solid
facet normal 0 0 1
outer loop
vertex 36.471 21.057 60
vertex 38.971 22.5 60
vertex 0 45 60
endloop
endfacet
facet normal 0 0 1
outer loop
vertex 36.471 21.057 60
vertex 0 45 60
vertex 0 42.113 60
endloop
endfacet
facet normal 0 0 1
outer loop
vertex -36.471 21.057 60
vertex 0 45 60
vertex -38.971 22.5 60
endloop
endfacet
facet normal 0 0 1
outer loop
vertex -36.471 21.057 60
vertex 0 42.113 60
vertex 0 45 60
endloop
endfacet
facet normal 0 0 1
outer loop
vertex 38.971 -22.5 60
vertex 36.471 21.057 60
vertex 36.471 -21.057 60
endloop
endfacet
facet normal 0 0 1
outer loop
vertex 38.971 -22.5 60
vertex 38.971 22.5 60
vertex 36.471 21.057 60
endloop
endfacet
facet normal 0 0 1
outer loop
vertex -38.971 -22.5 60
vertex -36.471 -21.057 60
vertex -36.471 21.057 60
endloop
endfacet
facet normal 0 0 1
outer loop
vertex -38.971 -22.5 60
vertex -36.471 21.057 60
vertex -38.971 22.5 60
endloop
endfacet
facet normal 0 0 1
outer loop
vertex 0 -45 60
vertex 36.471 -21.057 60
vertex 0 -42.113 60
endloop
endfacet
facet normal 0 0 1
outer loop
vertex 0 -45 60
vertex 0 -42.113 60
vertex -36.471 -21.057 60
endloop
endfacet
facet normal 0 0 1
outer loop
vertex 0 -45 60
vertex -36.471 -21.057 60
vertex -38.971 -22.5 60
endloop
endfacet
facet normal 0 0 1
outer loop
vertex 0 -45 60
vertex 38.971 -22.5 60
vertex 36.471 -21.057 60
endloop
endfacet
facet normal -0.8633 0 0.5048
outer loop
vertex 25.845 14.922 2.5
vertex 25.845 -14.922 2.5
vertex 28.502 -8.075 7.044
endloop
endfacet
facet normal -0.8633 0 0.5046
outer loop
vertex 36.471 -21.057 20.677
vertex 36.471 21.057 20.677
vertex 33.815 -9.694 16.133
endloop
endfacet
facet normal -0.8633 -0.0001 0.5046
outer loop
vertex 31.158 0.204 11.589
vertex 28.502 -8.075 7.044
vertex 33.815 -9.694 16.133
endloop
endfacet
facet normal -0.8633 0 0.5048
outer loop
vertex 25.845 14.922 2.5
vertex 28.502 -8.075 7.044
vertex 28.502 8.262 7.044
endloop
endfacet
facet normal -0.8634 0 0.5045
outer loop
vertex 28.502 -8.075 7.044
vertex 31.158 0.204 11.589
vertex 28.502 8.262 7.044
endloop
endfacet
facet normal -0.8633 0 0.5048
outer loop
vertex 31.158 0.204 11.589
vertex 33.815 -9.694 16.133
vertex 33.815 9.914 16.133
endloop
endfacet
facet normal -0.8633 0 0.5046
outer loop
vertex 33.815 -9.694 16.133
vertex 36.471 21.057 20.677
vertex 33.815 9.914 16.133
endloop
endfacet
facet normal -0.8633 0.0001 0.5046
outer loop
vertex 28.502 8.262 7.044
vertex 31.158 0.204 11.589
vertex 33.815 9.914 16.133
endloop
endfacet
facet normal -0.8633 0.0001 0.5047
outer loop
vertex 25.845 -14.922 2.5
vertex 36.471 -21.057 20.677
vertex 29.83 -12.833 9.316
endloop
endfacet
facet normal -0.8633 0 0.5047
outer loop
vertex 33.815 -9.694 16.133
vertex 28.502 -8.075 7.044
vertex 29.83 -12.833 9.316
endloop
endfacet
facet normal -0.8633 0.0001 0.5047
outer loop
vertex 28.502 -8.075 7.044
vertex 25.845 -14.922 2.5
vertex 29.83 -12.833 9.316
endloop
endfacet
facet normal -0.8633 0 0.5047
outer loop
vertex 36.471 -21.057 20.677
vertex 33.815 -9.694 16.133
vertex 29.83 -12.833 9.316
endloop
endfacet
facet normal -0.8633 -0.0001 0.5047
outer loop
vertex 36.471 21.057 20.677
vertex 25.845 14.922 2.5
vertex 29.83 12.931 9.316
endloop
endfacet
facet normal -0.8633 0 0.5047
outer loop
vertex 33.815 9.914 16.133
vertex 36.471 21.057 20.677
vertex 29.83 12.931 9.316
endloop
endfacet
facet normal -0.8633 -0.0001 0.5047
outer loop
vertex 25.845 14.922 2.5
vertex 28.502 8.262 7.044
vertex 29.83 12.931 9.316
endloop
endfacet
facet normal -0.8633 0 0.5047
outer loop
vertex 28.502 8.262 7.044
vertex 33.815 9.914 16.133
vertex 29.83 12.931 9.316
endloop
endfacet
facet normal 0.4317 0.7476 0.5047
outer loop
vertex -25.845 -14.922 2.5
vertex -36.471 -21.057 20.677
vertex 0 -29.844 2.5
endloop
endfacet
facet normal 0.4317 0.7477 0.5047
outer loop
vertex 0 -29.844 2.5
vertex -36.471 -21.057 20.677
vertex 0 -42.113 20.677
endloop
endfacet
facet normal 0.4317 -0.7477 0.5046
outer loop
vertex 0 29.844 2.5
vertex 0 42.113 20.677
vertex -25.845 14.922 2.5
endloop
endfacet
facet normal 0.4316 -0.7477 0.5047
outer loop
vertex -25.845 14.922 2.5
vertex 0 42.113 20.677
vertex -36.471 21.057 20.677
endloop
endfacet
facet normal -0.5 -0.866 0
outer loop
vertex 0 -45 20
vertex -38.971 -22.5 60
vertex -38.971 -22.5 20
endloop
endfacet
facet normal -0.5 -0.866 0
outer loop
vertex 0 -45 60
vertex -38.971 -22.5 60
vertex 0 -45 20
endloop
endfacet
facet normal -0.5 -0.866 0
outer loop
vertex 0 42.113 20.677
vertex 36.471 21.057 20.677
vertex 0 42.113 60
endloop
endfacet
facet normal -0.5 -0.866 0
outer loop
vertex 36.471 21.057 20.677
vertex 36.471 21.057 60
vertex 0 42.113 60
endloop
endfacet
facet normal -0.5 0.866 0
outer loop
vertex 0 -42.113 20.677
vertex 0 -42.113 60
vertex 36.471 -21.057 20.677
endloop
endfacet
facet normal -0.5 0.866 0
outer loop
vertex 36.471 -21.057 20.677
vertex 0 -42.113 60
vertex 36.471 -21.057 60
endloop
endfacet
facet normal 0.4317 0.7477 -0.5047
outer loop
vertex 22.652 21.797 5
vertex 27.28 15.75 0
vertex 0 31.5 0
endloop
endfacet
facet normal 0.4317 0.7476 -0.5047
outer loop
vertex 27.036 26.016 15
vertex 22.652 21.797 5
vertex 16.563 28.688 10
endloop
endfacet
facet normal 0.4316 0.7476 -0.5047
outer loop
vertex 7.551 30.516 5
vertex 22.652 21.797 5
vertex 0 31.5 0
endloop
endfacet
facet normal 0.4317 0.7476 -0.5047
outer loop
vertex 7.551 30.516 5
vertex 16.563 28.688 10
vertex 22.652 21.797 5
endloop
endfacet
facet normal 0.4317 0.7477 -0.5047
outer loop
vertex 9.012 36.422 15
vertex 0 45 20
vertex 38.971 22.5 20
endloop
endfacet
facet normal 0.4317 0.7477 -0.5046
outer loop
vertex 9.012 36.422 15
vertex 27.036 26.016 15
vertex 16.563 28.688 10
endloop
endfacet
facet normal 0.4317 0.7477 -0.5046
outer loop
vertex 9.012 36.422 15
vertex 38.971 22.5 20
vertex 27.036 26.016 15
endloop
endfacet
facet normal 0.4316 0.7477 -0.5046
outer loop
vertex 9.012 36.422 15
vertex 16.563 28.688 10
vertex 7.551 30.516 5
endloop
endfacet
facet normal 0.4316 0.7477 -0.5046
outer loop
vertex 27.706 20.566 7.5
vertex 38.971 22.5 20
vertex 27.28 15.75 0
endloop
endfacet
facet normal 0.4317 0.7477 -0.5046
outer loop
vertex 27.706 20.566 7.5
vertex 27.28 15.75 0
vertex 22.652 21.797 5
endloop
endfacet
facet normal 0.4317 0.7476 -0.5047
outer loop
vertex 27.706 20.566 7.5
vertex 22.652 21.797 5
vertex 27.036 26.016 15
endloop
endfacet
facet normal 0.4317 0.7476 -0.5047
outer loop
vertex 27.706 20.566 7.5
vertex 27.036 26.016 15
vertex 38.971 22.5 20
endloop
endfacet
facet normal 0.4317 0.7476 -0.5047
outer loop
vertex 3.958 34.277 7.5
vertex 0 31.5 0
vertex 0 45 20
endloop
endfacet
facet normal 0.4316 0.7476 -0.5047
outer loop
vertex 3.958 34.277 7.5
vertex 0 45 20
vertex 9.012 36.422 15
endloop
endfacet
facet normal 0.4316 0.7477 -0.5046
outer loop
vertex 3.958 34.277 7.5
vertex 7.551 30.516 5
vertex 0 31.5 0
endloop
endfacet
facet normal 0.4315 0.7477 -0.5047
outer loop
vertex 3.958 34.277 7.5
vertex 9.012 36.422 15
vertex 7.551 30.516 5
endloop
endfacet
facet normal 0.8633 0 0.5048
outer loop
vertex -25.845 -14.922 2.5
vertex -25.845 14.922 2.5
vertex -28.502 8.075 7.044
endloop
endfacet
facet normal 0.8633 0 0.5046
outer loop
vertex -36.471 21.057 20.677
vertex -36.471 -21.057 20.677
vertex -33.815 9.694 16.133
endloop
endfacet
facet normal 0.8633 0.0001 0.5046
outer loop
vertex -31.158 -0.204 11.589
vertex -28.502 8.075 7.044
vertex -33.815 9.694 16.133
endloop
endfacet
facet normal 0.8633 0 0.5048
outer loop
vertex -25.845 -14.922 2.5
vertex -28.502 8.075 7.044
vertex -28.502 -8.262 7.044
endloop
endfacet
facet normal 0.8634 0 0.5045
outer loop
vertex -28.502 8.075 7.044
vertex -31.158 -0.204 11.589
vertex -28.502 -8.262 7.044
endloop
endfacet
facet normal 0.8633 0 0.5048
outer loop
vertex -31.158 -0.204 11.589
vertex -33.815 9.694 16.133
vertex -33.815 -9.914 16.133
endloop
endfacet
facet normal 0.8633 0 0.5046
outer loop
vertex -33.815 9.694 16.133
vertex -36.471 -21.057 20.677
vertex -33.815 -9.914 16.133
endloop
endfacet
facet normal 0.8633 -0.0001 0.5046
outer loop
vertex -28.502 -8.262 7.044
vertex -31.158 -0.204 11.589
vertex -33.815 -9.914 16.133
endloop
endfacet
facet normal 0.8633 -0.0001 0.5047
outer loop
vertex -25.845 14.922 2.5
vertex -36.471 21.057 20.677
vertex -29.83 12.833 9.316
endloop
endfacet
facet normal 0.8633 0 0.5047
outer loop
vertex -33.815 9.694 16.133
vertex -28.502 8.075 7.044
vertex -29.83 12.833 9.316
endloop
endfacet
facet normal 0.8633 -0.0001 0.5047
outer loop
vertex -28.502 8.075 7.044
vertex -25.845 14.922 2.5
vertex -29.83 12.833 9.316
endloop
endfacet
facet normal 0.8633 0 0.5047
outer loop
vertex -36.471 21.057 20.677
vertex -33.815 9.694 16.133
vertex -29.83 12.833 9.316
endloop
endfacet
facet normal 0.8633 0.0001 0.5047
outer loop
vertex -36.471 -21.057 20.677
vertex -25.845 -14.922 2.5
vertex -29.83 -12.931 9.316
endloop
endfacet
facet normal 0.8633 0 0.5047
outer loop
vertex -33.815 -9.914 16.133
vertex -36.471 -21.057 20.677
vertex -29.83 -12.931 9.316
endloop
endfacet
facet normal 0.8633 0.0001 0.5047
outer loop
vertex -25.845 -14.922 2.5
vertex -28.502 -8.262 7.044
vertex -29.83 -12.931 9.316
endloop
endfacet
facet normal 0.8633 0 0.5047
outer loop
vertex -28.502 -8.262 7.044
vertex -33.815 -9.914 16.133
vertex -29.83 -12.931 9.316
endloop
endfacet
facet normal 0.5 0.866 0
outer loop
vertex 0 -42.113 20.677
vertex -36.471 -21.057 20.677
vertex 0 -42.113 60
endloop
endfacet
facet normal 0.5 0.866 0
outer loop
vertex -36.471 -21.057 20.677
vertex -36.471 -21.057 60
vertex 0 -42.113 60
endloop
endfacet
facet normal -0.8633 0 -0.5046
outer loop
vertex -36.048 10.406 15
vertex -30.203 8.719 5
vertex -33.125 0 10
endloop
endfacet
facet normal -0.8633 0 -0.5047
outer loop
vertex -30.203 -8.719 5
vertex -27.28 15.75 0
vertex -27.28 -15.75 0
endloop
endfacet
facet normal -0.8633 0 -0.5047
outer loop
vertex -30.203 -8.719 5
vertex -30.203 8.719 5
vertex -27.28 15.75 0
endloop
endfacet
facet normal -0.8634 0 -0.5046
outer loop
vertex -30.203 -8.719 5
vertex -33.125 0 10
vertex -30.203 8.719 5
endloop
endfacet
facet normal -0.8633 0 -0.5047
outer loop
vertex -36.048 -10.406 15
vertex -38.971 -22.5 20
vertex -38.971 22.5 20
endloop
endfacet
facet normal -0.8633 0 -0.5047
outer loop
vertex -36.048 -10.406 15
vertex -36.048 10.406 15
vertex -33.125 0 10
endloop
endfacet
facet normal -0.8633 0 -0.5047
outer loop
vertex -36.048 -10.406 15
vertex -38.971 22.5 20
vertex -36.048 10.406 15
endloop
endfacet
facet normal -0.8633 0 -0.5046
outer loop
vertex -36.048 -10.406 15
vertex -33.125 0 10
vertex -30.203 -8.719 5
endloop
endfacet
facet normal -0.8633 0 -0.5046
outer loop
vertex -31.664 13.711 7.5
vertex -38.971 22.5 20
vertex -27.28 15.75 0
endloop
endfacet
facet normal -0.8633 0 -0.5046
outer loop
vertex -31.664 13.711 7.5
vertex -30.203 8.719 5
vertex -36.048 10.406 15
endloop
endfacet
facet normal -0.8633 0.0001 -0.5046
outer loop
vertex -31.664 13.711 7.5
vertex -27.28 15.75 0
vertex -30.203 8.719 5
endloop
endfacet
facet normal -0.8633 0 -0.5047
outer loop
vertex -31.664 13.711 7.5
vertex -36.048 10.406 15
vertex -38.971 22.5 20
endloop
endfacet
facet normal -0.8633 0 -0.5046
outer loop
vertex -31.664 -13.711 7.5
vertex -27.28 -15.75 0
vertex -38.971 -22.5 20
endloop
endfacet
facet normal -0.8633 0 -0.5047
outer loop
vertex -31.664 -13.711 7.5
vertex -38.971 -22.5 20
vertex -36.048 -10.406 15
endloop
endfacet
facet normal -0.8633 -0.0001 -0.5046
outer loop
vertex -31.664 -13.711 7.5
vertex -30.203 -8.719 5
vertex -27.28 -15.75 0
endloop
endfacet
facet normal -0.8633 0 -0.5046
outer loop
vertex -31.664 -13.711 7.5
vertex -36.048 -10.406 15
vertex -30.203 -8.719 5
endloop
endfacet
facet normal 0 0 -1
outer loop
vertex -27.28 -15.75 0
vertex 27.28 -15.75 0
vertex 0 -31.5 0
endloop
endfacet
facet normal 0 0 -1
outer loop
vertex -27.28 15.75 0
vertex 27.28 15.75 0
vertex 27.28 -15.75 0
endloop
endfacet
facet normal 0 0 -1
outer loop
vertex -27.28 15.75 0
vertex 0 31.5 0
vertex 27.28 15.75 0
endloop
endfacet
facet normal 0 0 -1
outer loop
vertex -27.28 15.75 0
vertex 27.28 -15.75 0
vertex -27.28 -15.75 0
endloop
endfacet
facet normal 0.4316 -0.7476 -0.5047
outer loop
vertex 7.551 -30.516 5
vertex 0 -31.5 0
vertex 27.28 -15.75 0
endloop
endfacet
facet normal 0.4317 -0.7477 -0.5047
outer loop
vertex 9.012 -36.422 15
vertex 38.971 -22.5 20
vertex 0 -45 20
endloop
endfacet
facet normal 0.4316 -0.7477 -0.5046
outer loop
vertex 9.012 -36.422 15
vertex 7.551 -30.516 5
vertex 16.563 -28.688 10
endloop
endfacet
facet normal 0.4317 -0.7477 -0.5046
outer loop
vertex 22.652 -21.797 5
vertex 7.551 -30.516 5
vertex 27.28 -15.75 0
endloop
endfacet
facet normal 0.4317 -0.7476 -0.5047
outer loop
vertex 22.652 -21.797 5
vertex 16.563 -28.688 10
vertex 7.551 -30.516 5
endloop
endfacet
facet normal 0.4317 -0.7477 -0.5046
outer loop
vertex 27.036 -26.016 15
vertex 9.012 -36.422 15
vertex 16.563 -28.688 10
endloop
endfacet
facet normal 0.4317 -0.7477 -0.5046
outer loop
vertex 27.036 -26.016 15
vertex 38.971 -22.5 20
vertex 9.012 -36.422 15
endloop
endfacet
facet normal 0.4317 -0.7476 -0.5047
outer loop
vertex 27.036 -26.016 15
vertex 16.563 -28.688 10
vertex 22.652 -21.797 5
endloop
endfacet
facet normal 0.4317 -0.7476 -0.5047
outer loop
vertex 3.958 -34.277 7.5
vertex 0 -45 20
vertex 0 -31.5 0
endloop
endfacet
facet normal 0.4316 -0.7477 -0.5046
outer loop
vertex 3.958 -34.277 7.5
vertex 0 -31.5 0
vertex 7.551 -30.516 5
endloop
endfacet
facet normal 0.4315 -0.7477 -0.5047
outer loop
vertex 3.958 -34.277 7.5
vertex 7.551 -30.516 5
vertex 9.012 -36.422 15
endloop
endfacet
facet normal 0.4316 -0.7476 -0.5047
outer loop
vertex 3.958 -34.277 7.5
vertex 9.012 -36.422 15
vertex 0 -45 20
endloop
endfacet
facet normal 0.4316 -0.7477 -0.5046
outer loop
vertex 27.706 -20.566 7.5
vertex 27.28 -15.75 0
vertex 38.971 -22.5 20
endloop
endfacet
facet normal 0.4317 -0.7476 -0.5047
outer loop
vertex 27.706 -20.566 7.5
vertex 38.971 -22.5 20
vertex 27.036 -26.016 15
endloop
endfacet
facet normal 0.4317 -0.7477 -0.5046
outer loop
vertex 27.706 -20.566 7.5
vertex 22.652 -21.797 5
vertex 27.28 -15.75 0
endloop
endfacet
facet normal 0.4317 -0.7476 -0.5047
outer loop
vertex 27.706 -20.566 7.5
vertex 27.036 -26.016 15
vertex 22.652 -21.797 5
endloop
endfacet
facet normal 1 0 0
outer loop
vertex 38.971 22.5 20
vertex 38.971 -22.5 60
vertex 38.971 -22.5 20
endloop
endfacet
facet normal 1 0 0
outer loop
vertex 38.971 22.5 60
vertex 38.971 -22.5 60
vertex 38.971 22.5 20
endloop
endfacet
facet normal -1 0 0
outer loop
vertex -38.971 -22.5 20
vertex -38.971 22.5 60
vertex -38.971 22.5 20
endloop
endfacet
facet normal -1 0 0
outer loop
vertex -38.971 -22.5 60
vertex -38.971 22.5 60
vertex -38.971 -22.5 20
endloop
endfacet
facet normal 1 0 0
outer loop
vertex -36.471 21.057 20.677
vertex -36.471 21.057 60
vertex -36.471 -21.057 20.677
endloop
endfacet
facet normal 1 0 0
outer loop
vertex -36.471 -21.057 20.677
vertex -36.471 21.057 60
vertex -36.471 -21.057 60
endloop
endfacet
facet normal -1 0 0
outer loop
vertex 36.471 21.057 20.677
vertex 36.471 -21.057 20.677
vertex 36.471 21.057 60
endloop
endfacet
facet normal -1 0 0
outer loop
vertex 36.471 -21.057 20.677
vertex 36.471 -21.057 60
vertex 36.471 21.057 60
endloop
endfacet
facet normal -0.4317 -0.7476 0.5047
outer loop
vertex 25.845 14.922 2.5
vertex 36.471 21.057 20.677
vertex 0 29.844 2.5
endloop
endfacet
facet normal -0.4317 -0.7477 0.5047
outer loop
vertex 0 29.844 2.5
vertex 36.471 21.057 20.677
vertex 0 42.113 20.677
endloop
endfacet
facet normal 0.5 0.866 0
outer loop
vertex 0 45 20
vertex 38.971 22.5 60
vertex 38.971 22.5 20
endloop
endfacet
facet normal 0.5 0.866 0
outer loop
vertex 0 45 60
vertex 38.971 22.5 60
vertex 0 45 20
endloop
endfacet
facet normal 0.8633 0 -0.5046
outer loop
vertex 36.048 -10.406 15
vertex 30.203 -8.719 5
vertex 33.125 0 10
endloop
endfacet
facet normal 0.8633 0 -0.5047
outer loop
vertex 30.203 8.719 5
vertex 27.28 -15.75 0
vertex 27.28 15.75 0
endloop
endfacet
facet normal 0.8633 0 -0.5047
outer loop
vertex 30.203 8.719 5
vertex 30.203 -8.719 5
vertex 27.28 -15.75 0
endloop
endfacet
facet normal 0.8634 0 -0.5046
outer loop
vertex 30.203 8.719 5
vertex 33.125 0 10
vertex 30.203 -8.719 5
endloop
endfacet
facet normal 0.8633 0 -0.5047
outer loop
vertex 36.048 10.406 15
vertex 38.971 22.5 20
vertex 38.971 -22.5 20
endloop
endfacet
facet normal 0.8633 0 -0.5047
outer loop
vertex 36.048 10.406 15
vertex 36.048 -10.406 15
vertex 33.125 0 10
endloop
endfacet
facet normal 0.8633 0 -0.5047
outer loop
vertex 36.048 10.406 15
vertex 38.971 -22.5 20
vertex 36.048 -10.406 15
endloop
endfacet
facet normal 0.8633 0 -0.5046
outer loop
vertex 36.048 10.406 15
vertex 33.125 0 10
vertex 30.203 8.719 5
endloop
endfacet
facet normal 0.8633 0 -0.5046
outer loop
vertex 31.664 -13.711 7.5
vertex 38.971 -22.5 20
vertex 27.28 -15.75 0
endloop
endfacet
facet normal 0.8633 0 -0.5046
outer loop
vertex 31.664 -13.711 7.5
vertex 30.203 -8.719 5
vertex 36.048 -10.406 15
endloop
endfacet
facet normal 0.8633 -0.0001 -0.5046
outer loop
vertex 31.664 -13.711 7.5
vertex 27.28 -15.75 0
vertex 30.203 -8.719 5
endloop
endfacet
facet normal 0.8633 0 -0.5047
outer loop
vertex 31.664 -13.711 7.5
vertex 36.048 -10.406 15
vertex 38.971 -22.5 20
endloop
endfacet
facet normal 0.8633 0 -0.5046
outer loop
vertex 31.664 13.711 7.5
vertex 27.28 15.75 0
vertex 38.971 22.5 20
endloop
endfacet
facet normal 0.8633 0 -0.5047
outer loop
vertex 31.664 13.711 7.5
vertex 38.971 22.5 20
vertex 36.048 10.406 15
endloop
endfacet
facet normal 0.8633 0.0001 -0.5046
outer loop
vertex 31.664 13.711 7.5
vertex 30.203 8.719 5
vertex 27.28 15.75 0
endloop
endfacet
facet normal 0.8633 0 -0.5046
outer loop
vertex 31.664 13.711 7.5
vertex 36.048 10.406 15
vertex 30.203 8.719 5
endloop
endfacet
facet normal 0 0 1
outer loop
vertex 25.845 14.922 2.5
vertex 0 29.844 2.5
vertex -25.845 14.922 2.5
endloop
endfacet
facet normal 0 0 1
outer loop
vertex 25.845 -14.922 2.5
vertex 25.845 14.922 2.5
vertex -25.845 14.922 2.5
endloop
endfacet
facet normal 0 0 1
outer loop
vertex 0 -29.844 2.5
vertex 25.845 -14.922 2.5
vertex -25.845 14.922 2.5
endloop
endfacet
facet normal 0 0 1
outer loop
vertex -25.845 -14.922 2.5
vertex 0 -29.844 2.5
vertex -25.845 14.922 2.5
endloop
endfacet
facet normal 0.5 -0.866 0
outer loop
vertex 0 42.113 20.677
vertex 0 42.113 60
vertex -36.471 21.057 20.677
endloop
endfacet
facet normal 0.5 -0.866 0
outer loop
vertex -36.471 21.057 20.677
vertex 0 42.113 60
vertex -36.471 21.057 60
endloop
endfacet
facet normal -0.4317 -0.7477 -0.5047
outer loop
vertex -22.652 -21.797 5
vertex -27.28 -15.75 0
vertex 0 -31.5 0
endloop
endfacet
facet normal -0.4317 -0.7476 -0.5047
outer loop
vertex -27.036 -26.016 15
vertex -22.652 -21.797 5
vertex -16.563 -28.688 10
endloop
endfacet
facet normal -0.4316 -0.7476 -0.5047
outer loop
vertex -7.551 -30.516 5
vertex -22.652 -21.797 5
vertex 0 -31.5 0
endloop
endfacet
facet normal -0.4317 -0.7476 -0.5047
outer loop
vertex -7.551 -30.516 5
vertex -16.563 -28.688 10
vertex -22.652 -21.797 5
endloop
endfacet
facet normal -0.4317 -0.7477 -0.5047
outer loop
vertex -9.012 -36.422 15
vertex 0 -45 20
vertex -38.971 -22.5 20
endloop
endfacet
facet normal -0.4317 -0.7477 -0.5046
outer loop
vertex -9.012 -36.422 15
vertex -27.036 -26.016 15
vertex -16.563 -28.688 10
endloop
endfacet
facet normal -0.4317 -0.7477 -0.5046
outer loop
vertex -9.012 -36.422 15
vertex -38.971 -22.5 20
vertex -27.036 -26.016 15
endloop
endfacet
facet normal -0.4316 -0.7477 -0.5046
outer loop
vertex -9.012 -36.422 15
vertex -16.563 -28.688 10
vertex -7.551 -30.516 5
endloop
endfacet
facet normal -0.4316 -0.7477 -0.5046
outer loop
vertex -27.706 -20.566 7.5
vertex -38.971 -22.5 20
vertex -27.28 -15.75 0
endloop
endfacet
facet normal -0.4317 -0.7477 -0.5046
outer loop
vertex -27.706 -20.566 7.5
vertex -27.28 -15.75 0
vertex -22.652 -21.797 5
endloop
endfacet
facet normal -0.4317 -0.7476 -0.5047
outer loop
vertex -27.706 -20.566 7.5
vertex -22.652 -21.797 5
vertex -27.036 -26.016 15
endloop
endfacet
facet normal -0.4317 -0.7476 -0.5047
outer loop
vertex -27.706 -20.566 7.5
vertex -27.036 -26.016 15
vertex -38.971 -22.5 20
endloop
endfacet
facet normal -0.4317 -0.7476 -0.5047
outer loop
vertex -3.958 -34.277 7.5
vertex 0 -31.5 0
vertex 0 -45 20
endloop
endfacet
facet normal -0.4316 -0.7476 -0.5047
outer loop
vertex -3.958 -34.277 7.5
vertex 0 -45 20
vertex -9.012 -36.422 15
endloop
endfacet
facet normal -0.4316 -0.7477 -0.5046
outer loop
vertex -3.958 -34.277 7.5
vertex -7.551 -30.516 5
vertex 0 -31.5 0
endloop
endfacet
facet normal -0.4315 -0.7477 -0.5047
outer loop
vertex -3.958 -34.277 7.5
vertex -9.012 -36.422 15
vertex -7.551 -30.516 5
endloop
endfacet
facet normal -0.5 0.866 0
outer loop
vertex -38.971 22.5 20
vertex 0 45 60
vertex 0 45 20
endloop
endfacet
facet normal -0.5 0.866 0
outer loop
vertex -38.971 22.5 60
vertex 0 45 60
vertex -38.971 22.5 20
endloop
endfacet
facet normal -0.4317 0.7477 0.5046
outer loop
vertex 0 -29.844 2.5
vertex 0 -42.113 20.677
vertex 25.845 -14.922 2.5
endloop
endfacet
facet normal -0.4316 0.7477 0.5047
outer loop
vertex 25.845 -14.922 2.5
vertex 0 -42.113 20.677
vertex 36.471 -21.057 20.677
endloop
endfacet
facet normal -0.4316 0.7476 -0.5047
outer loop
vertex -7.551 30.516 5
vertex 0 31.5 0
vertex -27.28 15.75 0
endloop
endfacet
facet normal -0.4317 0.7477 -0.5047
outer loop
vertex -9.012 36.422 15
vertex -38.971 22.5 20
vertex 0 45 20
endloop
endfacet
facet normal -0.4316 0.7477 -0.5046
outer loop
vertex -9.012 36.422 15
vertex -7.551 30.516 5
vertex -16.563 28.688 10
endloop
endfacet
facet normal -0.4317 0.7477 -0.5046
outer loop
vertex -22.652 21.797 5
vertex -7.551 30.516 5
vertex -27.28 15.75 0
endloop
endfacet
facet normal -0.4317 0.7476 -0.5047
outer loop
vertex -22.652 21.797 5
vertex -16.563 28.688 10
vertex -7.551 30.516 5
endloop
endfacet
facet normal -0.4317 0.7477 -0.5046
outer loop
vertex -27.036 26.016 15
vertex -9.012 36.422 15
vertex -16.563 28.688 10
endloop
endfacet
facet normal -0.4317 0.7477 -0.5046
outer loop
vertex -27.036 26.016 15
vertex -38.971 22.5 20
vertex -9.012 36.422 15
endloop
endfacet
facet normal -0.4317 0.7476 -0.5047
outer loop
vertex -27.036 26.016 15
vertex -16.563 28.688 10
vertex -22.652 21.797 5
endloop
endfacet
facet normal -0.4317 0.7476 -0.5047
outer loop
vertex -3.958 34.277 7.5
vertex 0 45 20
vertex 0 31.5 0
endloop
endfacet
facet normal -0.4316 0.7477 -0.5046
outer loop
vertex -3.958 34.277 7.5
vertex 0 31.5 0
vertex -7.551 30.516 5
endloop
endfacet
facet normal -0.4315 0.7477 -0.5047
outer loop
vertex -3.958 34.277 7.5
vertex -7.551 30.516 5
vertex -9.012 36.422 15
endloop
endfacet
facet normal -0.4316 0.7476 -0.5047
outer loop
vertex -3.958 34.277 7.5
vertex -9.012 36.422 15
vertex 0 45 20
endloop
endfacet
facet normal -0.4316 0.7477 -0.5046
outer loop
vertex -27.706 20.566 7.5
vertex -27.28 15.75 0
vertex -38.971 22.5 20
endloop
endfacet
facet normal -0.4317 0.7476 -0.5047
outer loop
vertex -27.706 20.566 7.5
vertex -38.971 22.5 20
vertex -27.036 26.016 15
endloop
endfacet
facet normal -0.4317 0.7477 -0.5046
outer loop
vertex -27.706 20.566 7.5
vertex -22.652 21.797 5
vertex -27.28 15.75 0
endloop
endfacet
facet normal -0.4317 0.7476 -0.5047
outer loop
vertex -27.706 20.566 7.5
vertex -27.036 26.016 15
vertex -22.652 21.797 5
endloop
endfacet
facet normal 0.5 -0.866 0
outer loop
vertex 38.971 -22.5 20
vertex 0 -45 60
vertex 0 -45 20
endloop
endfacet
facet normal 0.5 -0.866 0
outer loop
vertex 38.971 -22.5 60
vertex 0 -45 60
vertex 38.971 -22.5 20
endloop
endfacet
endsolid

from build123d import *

# Parameters (mm, degrees)
F9_T = -2.5


with BuildPart() as f4:
    # F0 (on Top) → F4 section 0
    with BuildSketch(Plane.XY):
        Polygon((27.2798002192, 15.75), (0, 31.5), (-27.2798002192, 15.75), (-27.2798002192, -15.75), (0, -31.5), (27.2798002192, -15.75), align=None)
    # F2 (on offset) → F4 section 1
    with BuildSketch(Plane.XY.offset(20)):
        Polygon((-38.9711431703, -22.5), (0, -45), (38.9711431703, -22.5), (38.9711431703, 22.5), (0, 45), (-38.9711431703, 22.5), align=None)
    loft()


with BuildPart() as f5_1:
    # F5: copy of F4
    add(f4.part.moved(Location((0, 133, 0))))


with BuildPart() as f4_1:
    add(f4.part)

    # F4_face (on face) → F8 section 0
    with BuildSketch(Plane.XY.offset(20)):
        Polygon((38.9711431703, 22.5), (0, 45), (-38.9711431703, 22.5), (-38.9711431703, -22.5), (0, -45), (38.9711431703, -22.5), align=None)
    # F6 (on offset) → F8 section 1
    with BuildSketch(Plane.XY.offset(60)):
        Polygon((-38.9711431703, -22.5), (0, -45), (38.9711431703, -22.5), (38.9711431703, 22.5), (0, 45), (-38.9711431703, 22.5), align=None)
    loft()

    # F9
    f9_openings = [f4_1.faces().sort_by_distance(p)[0] for p in [
        (0, 0, 60),
    ]]
    offset(amount=F9_T, openings=f9_openings, kind=Kind.INTERSECTION)


solid = f4_1.part
